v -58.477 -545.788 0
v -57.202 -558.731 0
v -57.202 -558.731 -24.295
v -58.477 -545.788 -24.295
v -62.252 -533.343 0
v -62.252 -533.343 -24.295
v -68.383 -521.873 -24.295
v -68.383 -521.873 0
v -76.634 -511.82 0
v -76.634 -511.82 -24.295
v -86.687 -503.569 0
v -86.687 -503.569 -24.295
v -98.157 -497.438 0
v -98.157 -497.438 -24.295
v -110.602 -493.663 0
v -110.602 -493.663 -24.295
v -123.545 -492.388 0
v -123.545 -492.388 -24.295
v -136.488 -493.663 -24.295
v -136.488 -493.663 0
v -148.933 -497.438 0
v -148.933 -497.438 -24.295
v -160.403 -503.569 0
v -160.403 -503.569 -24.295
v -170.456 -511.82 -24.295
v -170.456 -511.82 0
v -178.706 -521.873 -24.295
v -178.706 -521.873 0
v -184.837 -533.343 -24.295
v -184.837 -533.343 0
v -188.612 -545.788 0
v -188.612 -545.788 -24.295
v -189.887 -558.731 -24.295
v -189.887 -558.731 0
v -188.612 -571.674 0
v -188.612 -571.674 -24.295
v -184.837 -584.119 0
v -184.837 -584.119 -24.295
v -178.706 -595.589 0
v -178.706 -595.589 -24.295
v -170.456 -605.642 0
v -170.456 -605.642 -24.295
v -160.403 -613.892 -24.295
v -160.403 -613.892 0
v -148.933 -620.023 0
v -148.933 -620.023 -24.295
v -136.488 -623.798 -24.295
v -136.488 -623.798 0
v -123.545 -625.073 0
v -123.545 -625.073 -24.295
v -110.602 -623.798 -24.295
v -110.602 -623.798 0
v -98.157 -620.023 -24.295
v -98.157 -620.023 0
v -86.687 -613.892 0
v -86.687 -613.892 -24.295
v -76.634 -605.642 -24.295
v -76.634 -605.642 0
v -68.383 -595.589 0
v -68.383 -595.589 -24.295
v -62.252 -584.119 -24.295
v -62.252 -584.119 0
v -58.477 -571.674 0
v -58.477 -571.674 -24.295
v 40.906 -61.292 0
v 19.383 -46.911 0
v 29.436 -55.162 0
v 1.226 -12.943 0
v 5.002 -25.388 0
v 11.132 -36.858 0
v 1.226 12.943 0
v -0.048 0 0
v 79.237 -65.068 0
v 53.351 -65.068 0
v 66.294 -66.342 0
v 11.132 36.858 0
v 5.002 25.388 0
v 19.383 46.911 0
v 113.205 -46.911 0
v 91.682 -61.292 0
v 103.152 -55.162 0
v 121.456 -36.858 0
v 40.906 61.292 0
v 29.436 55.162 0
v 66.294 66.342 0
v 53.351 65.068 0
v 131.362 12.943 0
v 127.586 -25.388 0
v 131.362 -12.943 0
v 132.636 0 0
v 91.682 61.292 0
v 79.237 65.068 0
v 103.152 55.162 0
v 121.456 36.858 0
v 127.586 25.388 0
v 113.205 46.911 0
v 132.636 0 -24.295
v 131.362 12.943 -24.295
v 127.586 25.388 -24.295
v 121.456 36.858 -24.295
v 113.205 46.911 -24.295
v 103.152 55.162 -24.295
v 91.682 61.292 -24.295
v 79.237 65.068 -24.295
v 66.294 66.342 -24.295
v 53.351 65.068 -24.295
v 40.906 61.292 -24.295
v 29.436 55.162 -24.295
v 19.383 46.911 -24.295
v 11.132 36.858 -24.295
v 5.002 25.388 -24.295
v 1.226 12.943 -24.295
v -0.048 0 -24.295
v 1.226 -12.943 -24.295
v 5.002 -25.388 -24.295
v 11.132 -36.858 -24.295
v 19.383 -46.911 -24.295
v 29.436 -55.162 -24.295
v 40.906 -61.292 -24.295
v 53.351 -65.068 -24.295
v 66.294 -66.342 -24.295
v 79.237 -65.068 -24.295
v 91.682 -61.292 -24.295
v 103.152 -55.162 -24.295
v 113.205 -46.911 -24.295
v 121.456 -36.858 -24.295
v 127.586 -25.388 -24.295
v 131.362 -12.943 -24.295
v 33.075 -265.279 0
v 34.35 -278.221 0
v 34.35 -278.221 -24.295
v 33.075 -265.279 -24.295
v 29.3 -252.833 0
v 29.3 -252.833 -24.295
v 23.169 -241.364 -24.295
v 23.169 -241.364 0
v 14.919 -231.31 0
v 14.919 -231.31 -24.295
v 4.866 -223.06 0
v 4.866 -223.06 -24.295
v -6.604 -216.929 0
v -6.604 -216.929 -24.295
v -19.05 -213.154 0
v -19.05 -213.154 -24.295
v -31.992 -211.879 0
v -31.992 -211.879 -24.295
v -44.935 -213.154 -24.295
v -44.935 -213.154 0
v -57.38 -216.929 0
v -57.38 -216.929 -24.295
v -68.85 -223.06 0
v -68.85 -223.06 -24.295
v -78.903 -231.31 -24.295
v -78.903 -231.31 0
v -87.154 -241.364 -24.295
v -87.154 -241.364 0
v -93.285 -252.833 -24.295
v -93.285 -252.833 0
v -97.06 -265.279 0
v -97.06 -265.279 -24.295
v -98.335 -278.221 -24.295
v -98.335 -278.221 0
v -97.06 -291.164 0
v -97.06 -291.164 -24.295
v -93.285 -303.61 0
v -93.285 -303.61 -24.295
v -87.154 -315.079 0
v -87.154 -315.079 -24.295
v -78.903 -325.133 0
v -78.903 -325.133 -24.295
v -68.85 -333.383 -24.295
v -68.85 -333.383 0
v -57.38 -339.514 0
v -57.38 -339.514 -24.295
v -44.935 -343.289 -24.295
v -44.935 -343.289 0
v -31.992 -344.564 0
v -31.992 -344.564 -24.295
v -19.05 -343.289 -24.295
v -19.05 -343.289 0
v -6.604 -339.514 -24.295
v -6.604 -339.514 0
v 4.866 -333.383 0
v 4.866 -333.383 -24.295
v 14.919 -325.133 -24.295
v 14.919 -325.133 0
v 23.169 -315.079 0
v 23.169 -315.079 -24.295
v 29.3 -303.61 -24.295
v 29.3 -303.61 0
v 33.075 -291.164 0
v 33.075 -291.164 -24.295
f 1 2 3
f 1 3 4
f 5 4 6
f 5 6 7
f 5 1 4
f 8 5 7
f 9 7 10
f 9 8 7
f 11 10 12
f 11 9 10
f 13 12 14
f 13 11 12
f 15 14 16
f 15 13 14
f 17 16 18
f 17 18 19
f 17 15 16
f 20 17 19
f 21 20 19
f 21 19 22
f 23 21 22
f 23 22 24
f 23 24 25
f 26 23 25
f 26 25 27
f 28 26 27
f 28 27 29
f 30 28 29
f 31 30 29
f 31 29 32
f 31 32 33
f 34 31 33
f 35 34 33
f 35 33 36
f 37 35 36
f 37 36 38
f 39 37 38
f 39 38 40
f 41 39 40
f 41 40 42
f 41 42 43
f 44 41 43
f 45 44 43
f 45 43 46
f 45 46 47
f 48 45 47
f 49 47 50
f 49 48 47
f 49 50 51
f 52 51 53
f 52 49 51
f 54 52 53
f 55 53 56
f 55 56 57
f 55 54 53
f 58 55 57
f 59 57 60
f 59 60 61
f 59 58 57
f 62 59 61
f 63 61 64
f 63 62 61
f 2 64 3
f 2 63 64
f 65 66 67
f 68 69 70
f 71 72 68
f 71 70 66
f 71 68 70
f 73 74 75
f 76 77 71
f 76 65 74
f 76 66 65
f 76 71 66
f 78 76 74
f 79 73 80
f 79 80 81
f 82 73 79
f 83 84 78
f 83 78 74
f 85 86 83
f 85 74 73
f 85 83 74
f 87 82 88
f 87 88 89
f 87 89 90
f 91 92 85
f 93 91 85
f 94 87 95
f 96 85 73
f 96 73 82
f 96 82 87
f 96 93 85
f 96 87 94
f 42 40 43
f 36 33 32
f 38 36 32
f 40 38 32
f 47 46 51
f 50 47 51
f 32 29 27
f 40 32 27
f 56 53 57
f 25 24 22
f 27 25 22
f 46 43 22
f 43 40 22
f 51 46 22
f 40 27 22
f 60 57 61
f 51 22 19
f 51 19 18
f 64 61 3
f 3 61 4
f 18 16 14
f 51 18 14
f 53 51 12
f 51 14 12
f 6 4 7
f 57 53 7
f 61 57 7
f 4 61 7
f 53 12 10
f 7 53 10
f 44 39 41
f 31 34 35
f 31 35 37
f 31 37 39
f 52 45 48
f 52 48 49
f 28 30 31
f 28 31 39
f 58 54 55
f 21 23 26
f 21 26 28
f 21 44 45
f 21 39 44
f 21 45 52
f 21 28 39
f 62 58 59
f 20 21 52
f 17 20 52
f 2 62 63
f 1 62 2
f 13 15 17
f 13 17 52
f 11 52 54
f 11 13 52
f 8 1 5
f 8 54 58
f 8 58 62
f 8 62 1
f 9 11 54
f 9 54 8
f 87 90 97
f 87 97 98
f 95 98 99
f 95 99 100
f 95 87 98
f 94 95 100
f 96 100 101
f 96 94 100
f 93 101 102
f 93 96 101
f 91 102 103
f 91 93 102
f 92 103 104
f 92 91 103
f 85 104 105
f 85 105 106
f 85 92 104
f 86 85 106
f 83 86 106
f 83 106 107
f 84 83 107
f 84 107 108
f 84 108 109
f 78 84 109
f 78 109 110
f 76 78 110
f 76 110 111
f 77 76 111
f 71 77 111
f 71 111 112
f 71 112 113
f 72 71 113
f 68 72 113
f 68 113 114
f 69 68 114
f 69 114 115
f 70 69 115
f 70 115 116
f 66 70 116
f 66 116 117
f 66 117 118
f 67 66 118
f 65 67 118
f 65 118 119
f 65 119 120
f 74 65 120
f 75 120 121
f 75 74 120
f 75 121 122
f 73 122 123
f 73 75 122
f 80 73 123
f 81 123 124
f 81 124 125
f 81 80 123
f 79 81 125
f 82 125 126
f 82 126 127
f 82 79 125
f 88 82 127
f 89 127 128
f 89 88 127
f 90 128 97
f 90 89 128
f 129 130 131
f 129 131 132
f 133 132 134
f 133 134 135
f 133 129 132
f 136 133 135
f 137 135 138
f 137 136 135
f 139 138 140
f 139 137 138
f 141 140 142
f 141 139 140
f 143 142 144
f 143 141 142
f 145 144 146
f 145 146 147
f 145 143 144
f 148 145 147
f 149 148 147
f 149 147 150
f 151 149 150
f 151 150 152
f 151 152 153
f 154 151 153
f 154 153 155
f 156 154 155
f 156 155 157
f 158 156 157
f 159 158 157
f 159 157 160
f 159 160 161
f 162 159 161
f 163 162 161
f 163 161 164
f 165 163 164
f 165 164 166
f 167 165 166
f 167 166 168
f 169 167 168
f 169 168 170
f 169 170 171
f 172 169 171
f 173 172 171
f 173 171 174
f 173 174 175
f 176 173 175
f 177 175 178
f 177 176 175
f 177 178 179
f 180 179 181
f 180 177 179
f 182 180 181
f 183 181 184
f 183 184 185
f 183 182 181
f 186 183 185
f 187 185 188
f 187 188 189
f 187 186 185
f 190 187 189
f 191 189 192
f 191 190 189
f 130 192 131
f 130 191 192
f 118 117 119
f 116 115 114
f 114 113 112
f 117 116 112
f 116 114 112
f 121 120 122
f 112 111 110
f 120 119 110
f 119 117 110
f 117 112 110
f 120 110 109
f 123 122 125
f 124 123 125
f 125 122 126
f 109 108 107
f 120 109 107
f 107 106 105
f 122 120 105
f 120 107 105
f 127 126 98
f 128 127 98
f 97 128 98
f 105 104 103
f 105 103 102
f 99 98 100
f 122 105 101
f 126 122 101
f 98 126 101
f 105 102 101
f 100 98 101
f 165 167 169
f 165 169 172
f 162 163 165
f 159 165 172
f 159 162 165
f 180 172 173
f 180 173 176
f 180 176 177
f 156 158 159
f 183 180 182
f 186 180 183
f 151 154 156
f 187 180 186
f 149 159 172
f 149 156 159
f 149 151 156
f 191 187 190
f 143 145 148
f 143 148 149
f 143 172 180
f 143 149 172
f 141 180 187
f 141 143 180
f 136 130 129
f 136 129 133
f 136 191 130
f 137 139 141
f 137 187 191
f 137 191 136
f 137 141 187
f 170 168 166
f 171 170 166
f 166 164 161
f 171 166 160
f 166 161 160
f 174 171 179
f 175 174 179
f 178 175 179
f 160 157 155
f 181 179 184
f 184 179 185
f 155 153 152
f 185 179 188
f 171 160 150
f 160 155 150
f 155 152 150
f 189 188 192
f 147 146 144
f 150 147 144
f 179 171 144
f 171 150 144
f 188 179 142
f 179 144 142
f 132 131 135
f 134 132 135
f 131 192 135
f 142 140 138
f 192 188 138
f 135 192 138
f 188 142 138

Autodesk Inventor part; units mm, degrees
ref_plane "YZ Plane" through (0, 0, 0) normal (1, 0, 0) x (0, 1, 0)
ref_plane "XZ Plane" through (0, 0, 0) normal (0, 1, 0) x (-1, 0, 0)
sketch "Sketch1" plane through (0, 0, 0) normal (0, 0, 1) x (1, 0, 0)
  circle A0 centre (66.294, 0) radius 66.3424 projected
  circle A1 centre (-31.9923, -278.2214) radius 66.3424 projected
  circle A2 centre (-123.5448, -558.7308) radius 66.3424 projected
  point P0 (0, 0)
ref_plane "Work Plane1" through (-256.2384, -691.4245, -24.2951) normal (0, 0, -1) x (-0.3658, 0.9307, 0)
extrude "Extrusion1" add sketch "Sketch1" against normal up to surface (24.2951 mm away)
properties part number "WheelCover"
